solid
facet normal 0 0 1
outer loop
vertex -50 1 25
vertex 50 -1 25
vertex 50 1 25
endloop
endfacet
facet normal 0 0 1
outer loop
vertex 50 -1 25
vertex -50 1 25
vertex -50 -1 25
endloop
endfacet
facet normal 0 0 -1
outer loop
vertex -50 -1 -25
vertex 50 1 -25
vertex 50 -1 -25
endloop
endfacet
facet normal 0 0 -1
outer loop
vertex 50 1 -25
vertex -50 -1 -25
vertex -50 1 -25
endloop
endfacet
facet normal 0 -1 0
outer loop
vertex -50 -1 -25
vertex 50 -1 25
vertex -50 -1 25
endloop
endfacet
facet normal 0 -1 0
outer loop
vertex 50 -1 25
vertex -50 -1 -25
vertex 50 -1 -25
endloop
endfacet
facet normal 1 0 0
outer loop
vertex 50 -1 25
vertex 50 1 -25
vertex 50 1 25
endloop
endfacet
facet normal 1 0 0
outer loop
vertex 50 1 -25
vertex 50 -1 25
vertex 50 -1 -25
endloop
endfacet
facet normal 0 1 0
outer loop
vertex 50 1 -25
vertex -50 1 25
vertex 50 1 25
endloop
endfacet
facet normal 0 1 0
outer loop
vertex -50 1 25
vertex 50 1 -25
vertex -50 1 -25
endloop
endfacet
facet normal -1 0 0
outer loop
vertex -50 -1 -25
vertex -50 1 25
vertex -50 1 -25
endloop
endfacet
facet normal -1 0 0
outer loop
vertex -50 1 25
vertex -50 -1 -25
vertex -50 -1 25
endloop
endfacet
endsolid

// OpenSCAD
// Sheet mild steel (geometry only) - single connected solid

length = 100;   // mm
width  = 50;    // mm
thickness = 2;  // mm

// Ensure the sheet is visible in orthographic views by orienting thickness along Y
module sheet_plate(l, w, t) {
    cube([l, t, w], center=true);
}

sheet_plate(length, width, thickness);
